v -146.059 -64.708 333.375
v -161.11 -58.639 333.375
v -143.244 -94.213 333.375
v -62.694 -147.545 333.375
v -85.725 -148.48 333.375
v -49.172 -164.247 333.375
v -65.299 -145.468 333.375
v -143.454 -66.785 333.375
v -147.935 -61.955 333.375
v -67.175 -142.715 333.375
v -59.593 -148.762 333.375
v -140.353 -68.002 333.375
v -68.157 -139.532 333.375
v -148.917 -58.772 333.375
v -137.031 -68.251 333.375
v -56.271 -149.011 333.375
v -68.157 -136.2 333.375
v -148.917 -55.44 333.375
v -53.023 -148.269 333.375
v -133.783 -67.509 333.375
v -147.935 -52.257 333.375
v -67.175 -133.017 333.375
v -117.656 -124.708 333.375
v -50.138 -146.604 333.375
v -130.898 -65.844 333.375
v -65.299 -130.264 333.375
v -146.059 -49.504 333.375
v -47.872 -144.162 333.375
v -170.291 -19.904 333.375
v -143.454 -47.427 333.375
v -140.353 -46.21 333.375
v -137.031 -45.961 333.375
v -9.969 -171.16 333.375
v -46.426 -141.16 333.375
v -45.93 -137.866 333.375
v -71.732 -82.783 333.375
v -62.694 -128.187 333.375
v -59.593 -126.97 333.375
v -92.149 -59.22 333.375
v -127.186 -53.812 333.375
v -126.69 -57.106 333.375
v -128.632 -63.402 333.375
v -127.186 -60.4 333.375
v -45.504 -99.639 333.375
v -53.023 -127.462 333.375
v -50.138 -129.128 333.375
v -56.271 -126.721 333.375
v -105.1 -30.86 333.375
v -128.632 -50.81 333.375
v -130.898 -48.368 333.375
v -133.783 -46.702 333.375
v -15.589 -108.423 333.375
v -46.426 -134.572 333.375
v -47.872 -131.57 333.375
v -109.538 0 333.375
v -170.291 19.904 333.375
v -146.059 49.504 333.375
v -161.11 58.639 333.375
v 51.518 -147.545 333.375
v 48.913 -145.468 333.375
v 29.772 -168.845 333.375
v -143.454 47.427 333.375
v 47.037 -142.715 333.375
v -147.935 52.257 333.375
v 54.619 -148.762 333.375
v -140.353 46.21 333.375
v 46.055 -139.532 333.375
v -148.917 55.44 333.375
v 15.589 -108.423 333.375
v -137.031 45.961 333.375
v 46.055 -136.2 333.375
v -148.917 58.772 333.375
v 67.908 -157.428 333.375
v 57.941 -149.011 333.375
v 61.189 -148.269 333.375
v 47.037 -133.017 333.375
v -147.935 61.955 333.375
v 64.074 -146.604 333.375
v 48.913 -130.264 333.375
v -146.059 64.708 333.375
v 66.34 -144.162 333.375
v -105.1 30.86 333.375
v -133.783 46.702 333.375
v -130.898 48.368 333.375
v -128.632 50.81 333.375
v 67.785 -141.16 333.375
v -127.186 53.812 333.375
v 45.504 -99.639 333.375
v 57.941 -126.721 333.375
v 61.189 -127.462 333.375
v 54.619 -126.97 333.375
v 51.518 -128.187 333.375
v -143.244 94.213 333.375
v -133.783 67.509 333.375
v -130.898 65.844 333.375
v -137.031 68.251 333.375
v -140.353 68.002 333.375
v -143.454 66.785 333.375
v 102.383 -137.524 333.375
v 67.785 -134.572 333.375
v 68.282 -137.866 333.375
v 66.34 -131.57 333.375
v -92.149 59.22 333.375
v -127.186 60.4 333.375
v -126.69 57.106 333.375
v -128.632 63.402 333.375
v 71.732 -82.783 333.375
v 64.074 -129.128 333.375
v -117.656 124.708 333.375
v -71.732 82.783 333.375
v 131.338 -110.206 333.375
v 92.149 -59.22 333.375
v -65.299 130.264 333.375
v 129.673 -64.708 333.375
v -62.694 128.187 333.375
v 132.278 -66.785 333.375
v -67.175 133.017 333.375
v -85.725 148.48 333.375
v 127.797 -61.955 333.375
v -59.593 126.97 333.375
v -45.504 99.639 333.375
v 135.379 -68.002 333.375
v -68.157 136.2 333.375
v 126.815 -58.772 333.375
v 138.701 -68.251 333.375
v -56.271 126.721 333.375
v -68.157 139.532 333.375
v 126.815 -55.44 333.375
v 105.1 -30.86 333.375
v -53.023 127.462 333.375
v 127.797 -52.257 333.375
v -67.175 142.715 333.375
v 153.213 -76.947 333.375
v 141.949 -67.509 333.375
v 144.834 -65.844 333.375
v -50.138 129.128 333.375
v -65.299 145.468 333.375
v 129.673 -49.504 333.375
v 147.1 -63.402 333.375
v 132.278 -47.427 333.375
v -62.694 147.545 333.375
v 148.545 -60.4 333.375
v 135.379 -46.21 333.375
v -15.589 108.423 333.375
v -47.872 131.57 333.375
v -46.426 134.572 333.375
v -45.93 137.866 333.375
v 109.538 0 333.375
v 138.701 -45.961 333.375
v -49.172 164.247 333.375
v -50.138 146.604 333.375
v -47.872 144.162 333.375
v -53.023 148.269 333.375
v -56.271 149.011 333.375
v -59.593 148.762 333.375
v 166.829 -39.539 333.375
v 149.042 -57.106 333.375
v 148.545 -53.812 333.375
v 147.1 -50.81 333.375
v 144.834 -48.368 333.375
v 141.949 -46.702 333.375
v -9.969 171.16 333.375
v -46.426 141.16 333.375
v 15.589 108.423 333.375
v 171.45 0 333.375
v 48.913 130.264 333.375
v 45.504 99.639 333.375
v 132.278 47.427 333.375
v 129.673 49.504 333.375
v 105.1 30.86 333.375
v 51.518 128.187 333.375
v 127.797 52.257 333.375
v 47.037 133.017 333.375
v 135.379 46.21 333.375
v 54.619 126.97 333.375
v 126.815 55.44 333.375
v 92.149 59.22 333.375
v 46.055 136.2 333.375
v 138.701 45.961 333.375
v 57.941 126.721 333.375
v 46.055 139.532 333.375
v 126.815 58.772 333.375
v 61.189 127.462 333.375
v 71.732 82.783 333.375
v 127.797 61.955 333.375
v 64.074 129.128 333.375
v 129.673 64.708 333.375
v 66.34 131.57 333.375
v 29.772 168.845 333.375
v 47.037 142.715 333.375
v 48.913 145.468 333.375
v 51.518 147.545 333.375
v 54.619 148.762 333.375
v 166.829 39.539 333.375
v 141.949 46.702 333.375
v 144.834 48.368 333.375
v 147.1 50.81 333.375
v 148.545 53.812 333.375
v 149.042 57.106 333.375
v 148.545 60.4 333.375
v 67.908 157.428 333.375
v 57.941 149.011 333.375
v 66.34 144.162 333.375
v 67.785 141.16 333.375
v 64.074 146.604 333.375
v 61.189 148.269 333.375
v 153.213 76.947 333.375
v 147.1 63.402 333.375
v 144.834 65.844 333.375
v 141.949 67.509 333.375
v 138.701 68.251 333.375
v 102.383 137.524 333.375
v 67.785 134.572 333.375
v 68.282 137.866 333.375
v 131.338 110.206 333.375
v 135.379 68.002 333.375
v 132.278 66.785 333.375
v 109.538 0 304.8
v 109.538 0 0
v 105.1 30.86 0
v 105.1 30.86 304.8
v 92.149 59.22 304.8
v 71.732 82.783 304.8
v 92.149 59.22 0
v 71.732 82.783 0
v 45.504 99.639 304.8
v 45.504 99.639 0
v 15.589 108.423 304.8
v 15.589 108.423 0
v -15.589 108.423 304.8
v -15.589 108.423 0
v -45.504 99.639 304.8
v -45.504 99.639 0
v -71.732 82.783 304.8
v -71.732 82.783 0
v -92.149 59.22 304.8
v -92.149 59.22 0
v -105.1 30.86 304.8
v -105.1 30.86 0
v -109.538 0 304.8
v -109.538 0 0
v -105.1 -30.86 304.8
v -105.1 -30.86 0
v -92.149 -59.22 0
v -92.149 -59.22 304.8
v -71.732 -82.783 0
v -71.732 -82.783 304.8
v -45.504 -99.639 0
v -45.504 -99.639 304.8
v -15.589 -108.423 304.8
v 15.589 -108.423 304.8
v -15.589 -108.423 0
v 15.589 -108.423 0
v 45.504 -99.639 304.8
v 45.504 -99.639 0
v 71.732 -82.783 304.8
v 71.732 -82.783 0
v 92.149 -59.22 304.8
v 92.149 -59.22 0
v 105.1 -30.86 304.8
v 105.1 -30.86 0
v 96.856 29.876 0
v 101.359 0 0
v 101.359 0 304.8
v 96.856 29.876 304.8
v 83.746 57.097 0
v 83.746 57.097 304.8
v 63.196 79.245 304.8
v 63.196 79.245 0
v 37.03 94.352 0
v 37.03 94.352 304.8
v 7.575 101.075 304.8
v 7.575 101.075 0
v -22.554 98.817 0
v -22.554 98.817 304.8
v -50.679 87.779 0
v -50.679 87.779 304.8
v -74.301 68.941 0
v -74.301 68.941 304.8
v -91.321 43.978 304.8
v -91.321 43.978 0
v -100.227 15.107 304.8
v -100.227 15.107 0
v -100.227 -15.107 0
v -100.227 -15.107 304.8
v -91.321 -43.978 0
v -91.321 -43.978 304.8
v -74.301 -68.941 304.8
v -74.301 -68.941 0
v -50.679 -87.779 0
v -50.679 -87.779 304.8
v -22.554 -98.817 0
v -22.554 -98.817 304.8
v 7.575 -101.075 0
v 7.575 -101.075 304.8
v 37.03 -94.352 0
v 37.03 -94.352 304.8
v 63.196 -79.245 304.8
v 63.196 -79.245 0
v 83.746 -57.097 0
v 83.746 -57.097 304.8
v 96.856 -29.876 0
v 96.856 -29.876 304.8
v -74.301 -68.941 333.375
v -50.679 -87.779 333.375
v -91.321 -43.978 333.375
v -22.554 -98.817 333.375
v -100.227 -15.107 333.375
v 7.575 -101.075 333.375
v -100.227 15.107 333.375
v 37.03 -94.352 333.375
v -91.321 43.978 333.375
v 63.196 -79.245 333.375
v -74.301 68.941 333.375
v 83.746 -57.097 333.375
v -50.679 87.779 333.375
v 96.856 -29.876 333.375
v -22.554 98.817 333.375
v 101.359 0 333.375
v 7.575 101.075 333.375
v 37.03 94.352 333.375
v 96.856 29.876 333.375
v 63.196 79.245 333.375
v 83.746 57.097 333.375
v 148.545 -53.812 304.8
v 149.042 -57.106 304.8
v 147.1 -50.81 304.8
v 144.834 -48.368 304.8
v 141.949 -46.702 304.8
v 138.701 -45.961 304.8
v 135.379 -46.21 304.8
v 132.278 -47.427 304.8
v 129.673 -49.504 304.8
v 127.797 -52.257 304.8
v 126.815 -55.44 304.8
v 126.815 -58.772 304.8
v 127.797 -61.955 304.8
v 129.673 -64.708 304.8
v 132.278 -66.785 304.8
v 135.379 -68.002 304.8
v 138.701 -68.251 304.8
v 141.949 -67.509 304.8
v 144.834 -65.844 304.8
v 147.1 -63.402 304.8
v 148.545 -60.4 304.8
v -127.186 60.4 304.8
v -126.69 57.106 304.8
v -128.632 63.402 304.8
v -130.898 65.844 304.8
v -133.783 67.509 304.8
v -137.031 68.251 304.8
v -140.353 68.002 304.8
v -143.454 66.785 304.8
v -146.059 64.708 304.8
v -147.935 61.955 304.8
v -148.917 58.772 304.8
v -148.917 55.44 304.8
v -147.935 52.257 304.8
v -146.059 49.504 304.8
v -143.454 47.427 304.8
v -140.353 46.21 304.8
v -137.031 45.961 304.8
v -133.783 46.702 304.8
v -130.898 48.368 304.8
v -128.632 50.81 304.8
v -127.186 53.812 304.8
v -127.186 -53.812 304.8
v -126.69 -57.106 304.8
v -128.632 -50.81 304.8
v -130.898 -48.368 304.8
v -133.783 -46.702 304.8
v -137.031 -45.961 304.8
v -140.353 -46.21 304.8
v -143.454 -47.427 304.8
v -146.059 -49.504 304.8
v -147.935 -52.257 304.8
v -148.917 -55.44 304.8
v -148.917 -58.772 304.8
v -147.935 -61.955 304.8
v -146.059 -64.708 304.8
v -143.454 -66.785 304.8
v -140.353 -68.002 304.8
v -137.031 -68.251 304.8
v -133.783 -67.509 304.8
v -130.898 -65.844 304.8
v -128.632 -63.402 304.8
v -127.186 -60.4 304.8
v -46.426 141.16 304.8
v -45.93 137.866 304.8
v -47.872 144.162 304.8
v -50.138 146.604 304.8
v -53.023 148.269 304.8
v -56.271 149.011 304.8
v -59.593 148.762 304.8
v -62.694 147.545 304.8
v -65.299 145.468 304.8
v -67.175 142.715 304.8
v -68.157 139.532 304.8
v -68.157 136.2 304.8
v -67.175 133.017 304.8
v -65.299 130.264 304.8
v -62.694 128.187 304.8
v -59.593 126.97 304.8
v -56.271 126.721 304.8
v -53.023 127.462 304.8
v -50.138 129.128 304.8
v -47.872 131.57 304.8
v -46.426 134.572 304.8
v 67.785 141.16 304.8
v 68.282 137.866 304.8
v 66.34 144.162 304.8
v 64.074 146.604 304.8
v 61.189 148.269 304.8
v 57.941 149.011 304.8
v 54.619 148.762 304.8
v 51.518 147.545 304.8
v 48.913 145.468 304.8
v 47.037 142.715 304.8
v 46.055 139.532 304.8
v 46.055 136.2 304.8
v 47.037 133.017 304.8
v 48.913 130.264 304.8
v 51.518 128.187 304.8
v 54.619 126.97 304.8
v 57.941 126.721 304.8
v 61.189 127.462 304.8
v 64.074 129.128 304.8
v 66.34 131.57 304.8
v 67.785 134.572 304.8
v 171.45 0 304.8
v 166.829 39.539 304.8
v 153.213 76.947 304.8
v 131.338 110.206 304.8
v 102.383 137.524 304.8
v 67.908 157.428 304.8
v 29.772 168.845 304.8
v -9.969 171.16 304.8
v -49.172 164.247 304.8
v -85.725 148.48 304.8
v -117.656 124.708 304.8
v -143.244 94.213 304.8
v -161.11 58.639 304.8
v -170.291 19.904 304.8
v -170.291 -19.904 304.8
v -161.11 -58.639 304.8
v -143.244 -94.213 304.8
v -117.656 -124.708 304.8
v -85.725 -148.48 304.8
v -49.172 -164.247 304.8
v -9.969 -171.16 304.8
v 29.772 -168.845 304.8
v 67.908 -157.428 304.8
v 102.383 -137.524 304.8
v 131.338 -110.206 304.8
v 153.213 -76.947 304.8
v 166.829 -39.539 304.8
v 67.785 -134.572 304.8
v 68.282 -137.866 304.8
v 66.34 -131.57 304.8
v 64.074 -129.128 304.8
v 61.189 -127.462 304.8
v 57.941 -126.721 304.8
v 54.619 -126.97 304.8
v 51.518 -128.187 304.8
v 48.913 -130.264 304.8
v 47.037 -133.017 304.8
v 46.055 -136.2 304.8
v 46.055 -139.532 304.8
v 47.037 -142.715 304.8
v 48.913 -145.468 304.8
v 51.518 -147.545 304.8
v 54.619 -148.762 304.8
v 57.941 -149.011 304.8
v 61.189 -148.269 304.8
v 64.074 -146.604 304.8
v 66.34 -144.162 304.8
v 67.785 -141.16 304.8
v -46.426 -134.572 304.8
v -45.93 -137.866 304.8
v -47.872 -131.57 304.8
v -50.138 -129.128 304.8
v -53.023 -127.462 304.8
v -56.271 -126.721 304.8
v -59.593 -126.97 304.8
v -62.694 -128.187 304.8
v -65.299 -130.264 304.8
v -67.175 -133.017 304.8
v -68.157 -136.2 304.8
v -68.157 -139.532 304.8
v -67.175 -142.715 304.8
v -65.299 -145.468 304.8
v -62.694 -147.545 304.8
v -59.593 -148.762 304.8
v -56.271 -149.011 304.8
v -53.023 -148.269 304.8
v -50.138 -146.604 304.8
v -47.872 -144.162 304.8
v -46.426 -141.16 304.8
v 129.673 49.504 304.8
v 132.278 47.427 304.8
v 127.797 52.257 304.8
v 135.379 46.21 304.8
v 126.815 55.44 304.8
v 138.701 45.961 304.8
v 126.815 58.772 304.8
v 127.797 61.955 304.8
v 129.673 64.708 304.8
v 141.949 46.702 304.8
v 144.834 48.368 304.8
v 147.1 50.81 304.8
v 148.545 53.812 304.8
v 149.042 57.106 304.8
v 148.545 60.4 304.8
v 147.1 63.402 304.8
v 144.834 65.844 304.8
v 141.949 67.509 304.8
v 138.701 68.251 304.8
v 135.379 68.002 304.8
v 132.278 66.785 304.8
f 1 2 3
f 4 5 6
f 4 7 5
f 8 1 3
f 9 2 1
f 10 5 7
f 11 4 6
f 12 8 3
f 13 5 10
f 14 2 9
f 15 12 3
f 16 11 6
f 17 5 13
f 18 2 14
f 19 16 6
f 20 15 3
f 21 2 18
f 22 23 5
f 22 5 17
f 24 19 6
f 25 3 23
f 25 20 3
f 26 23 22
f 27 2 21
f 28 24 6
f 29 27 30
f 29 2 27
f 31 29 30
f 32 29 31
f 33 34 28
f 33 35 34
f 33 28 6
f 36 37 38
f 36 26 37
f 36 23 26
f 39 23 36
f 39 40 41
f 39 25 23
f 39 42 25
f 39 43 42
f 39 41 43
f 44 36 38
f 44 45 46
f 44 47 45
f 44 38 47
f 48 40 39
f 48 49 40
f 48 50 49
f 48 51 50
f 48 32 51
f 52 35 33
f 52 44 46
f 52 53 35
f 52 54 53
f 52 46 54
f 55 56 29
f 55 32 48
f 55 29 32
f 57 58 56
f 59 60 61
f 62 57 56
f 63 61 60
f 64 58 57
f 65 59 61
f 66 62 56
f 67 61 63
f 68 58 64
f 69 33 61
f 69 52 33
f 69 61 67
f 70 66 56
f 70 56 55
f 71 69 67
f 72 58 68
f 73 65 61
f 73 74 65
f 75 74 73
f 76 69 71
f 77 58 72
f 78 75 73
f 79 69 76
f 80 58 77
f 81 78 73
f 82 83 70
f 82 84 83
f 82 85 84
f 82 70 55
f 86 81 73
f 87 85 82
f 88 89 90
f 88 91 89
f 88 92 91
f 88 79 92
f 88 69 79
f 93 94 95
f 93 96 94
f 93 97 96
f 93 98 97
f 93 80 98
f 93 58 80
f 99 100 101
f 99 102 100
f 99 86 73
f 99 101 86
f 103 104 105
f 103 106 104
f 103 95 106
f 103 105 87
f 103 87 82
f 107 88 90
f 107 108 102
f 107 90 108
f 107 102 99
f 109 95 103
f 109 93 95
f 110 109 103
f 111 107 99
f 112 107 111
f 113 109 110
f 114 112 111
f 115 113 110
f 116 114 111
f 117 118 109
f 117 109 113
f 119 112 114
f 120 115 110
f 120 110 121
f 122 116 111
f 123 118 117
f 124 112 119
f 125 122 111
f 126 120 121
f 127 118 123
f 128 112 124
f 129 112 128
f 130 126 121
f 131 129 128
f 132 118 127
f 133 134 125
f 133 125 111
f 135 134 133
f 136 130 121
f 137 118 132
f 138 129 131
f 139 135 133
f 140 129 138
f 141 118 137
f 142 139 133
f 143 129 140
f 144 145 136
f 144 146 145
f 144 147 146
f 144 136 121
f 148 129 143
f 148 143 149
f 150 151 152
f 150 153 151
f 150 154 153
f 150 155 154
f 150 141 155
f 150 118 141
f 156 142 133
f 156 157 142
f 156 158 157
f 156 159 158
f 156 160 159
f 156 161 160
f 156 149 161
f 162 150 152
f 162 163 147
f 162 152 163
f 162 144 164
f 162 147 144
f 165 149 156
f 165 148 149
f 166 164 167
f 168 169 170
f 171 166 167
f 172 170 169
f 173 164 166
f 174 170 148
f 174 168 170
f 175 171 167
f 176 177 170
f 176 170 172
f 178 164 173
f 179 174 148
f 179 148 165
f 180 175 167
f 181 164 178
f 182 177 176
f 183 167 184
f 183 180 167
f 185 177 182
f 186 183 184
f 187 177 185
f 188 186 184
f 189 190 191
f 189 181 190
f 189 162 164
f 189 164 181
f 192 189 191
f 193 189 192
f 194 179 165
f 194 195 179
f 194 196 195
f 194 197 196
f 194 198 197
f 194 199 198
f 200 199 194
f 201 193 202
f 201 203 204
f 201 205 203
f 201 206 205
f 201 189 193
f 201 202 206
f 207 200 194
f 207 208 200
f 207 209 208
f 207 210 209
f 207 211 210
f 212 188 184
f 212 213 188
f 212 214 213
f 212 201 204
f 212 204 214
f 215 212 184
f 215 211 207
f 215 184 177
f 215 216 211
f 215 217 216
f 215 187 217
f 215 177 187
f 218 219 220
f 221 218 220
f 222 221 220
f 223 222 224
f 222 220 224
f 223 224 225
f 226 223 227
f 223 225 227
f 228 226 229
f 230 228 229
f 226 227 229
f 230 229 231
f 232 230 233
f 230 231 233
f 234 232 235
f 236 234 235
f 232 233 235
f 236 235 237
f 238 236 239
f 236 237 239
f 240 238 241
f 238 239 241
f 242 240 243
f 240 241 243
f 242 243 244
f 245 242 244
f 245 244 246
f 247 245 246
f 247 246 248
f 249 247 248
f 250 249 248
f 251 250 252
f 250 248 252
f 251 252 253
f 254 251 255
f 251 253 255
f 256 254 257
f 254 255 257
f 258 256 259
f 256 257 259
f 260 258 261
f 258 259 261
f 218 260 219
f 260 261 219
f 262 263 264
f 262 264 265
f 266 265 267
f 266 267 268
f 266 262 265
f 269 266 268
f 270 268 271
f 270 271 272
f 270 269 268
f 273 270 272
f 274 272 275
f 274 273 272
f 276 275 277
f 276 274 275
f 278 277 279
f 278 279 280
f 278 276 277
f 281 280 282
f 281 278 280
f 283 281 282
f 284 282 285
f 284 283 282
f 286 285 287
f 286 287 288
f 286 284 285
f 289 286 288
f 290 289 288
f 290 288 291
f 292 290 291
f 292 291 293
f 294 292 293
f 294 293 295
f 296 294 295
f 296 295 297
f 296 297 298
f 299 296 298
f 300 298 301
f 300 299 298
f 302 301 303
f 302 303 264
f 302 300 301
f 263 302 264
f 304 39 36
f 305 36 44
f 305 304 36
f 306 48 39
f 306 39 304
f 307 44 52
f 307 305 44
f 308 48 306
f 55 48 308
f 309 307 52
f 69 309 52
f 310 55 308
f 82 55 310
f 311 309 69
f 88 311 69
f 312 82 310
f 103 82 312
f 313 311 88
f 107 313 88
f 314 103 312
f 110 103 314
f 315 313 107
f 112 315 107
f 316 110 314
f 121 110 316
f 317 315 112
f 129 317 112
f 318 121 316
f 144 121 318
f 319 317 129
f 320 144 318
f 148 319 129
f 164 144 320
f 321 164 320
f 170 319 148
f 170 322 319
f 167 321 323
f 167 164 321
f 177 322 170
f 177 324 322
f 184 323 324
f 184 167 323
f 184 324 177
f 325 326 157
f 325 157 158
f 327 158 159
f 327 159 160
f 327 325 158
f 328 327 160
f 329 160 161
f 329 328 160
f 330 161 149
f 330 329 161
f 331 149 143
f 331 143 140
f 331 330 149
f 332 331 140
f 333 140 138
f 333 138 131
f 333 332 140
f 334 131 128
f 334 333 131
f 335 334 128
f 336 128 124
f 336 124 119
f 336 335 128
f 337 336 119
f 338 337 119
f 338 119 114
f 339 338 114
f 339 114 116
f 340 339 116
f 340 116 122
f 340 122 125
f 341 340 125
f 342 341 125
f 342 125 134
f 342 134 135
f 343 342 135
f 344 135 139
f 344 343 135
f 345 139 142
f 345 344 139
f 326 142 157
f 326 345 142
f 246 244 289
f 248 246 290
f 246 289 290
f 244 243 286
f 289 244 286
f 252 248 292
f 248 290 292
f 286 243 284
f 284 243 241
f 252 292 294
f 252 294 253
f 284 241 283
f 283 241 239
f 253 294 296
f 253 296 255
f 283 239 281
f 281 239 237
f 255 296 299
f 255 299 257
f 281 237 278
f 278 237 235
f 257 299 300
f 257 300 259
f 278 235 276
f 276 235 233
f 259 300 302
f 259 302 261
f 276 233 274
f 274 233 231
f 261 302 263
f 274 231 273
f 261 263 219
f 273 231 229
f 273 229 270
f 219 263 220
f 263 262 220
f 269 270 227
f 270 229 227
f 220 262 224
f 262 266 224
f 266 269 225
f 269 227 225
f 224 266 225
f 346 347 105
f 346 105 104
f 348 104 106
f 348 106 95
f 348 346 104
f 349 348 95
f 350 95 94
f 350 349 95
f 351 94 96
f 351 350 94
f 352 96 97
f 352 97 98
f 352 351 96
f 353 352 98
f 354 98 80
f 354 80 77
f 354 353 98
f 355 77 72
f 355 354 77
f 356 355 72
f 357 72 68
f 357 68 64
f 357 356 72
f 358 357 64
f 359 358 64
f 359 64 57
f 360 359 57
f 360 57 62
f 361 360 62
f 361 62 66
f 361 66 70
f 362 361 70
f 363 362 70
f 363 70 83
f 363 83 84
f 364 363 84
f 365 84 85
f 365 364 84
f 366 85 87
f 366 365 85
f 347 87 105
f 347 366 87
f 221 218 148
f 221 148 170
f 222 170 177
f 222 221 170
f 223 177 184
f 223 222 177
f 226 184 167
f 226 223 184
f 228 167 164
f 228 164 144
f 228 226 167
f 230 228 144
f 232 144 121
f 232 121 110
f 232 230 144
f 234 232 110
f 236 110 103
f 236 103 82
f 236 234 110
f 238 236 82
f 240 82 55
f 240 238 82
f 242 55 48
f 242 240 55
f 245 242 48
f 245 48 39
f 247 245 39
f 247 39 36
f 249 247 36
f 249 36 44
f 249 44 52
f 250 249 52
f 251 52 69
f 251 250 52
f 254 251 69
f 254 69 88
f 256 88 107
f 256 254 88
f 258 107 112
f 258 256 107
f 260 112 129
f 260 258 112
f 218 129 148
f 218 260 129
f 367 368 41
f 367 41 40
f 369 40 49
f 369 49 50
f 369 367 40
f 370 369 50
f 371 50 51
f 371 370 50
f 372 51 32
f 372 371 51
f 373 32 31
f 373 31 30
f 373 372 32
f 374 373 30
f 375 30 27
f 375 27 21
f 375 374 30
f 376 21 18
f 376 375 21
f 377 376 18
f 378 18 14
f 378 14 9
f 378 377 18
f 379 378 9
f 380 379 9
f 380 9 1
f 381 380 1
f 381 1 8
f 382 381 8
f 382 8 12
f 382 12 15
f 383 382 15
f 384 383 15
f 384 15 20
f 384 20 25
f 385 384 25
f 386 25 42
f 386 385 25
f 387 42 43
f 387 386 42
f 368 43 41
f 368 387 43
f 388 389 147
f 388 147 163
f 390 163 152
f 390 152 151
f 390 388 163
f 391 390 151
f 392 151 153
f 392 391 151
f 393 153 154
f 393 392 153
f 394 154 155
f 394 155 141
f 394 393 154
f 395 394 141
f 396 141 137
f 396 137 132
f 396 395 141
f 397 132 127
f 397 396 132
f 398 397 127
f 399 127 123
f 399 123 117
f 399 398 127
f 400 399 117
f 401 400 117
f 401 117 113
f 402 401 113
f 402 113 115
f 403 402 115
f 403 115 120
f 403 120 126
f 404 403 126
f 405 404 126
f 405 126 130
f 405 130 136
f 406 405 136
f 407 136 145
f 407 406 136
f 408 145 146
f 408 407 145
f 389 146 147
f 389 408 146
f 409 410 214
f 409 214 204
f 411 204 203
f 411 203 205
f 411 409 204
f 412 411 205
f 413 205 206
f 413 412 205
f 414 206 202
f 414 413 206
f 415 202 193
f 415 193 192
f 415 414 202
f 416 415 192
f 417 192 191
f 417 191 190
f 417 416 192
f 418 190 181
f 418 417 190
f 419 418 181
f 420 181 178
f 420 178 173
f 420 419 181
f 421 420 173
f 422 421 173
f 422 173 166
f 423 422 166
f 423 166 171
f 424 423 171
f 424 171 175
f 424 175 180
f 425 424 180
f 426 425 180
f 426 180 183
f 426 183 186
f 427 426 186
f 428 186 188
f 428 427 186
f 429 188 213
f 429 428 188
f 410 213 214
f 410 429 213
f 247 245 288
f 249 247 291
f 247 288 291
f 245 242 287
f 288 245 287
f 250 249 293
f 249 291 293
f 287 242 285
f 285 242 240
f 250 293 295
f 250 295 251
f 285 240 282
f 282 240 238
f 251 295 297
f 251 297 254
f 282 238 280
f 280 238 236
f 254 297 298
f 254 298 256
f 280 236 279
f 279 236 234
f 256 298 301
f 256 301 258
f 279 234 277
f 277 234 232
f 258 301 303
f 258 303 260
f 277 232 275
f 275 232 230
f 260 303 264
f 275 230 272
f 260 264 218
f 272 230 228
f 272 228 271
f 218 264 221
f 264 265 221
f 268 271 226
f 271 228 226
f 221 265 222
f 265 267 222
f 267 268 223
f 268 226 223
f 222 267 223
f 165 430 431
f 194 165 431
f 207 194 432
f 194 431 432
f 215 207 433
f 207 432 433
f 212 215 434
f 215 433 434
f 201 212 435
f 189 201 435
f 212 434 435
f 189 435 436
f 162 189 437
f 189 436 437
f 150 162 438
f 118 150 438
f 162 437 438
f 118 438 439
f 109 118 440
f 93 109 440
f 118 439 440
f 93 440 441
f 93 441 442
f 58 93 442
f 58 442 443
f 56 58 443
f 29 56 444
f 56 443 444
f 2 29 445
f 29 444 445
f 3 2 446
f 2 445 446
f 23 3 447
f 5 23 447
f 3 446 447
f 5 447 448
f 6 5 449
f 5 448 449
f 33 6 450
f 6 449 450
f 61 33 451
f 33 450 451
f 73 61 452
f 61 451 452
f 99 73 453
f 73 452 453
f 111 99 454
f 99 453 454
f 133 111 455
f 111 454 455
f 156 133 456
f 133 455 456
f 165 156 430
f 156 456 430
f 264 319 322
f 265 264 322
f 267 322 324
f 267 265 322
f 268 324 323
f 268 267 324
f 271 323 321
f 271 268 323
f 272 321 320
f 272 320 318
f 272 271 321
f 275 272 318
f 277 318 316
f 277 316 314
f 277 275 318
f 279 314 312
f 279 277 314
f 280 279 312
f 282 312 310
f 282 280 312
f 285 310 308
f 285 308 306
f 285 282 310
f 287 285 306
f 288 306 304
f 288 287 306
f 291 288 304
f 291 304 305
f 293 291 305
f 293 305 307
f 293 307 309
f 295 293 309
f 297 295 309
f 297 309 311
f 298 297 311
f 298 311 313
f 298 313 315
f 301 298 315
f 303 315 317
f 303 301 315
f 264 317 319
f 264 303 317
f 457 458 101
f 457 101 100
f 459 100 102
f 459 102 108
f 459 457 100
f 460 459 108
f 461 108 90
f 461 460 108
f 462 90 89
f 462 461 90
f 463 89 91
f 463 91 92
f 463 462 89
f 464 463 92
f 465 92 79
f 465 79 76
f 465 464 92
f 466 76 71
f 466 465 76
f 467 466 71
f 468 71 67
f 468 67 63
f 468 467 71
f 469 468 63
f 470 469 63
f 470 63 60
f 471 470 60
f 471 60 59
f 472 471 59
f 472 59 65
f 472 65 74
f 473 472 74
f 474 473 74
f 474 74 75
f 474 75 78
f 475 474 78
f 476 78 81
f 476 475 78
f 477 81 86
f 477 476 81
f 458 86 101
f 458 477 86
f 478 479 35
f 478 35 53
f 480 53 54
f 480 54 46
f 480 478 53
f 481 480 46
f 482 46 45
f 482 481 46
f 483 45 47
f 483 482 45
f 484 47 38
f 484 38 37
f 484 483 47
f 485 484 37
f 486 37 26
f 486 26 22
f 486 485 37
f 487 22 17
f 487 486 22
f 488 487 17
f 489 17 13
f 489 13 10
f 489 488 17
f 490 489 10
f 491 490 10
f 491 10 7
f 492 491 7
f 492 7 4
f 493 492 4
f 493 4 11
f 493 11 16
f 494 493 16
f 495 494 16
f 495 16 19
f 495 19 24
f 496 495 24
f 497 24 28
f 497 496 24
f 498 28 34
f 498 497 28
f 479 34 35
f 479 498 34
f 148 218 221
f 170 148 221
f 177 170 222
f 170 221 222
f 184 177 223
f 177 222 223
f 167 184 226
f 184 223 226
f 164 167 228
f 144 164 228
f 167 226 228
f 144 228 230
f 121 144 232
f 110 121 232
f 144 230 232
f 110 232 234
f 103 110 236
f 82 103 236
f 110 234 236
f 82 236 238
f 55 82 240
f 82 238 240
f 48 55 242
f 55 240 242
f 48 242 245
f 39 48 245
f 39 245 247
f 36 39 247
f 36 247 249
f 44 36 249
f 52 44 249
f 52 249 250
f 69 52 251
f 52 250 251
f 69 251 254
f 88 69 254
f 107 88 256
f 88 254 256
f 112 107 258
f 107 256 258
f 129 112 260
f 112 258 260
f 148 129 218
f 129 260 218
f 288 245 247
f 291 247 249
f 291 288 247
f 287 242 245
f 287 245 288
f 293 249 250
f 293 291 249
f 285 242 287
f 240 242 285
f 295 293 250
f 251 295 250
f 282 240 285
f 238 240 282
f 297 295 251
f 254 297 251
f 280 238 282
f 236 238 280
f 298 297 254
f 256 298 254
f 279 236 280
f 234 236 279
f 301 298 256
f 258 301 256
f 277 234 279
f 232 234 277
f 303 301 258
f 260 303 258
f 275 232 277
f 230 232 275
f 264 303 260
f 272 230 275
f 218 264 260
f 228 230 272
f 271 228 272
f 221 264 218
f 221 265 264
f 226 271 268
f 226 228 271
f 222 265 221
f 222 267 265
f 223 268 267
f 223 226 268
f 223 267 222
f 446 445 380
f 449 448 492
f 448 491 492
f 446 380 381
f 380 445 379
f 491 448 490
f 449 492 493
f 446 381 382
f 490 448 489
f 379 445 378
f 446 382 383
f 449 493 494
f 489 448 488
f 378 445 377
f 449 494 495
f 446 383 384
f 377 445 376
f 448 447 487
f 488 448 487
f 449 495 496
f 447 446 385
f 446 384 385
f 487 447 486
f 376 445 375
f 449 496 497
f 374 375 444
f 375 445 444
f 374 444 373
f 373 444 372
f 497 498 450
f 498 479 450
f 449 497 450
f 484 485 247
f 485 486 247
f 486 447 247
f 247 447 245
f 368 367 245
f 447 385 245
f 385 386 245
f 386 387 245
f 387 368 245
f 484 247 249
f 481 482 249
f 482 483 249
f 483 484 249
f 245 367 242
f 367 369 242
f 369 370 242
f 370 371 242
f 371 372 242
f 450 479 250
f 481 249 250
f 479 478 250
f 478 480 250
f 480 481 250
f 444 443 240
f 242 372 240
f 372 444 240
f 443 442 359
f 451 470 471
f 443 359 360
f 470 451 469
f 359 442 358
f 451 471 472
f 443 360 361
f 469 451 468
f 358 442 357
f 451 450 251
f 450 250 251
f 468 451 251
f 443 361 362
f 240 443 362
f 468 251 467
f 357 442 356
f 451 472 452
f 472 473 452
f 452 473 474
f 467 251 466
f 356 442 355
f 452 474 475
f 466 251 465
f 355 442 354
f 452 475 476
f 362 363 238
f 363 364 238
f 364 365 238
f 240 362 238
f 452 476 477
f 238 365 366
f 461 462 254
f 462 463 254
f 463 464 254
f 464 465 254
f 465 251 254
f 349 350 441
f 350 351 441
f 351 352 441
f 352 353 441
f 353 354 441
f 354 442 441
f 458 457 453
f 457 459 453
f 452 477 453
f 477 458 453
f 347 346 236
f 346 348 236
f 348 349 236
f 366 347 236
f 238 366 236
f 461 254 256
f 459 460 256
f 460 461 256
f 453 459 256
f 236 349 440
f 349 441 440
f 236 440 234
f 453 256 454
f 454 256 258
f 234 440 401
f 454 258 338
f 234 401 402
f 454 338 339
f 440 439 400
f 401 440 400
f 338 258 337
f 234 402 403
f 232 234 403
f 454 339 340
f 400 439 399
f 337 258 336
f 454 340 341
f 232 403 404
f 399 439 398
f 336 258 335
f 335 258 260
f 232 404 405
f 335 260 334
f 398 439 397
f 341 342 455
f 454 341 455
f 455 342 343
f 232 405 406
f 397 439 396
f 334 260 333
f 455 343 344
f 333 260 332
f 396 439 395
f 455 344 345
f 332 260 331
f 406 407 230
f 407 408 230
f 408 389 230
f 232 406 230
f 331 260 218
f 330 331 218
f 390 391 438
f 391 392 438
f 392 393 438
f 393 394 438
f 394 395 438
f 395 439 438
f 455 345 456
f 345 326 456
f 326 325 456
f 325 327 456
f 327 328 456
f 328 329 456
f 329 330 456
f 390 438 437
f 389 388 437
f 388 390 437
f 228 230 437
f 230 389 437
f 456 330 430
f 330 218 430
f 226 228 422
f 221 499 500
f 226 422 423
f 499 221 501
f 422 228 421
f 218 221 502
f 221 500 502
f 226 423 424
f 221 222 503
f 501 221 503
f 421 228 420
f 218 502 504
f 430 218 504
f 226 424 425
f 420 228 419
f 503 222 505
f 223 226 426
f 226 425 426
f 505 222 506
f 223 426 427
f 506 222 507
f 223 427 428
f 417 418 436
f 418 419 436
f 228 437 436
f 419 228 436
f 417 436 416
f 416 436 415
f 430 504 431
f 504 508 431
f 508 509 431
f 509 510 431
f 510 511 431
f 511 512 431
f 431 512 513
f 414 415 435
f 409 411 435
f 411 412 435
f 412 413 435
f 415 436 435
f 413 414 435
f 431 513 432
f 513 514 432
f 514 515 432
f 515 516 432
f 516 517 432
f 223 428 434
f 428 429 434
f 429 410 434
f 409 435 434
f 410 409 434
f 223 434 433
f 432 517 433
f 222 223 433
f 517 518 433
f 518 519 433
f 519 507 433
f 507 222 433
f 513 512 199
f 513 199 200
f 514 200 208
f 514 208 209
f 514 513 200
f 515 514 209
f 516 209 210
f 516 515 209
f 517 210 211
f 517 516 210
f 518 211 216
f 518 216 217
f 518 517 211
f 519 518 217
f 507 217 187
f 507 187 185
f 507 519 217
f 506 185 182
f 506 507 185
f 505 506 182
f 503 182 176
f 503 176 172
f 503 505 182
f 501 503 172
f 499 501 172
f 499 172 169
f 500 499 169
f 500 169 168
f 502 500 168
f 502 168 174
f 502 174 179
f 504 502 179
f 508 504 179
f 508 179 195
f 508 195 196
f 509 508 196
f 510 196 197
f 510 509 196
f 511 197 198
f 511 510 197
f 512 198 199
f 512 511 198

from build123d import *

# Parameters (mm, degrees)
F0_R     = 109.5375
F0_R_2   = 101.3587
F1_DEPTH = 304.8
F2_R     = 171.45
F2_R_2   = 11.176
F2_R_3   = 109.5375
F3_DEPTH = 28.575
F4_DEPTH = 28.575


# Not quite as in the source:
# - a feature names something its author has since deleted; it is built from what else it names


with BuildPart() as f1:
    # F0 (on Top) → F1 (new body)
    with BuildSketch(Plane.XY):
        Circle(F0_R)
        Circle(F0_R_2, mode=Mode.SUBTRACT)
    extrude(amount=F1_DEPTH)


with BuildPart() as f3:
    # F2 (on face) → F3 (new body)
    with BuildSketch(Plane.XY.offset(304.8)):
        Circle(F2_R)
        with Locations((-57.1059351947, -137.865923239)):
            Circle(F2_R_2, mode=Mode.SUBTRACT)
        with Locations((-137.865923239, -57.1059351947)):
            Circle(F2_R_2, mode=Mode.SUBTRACT)
        with Locations((57.1059351947, -137.865923239)):
            Circle(F2_R_2, mode=Mode.SUBTRACT)
        with Locations((137.865923239, -57.1059351947)):
            Circle(F2_R_2, mode=Mode.SUBTRACT)
        with Locations((-137.865923239, 57.1059351947)):
            Circle(F2_R_2, mode=Mode.SUBTRACT)
        with Locations((-57.1059351947, 137.865923239)):
            Circle(F2_R_2, mode=Mode.SUBTRACT)
        Circle(F2_R_3, mode=Mode.SUBTRACT)
        with Locations((137.865923239, 57.1059351947)):
            Circle(F2_R_2, mode=Mode.SUBTRACT)
        with Locations((57.1059351947, 137.865923239)):
            Circle(F2_R_2, mode=Mode.SUBTRACT)
    extrude(amount=F3_DEPTH)


with BuildPart() as f4:
    # F4 (new): a face of the model
    f4_faces = [f1.part.faces().sort_by_distance(p)[0] for p in [
        (-106.4393116382, 0, 304.8),
    ]]
    extrude(f4_faces, amount=F4_DEPTH)


solid = Compound([f1.part, f3.part, f4.part])
